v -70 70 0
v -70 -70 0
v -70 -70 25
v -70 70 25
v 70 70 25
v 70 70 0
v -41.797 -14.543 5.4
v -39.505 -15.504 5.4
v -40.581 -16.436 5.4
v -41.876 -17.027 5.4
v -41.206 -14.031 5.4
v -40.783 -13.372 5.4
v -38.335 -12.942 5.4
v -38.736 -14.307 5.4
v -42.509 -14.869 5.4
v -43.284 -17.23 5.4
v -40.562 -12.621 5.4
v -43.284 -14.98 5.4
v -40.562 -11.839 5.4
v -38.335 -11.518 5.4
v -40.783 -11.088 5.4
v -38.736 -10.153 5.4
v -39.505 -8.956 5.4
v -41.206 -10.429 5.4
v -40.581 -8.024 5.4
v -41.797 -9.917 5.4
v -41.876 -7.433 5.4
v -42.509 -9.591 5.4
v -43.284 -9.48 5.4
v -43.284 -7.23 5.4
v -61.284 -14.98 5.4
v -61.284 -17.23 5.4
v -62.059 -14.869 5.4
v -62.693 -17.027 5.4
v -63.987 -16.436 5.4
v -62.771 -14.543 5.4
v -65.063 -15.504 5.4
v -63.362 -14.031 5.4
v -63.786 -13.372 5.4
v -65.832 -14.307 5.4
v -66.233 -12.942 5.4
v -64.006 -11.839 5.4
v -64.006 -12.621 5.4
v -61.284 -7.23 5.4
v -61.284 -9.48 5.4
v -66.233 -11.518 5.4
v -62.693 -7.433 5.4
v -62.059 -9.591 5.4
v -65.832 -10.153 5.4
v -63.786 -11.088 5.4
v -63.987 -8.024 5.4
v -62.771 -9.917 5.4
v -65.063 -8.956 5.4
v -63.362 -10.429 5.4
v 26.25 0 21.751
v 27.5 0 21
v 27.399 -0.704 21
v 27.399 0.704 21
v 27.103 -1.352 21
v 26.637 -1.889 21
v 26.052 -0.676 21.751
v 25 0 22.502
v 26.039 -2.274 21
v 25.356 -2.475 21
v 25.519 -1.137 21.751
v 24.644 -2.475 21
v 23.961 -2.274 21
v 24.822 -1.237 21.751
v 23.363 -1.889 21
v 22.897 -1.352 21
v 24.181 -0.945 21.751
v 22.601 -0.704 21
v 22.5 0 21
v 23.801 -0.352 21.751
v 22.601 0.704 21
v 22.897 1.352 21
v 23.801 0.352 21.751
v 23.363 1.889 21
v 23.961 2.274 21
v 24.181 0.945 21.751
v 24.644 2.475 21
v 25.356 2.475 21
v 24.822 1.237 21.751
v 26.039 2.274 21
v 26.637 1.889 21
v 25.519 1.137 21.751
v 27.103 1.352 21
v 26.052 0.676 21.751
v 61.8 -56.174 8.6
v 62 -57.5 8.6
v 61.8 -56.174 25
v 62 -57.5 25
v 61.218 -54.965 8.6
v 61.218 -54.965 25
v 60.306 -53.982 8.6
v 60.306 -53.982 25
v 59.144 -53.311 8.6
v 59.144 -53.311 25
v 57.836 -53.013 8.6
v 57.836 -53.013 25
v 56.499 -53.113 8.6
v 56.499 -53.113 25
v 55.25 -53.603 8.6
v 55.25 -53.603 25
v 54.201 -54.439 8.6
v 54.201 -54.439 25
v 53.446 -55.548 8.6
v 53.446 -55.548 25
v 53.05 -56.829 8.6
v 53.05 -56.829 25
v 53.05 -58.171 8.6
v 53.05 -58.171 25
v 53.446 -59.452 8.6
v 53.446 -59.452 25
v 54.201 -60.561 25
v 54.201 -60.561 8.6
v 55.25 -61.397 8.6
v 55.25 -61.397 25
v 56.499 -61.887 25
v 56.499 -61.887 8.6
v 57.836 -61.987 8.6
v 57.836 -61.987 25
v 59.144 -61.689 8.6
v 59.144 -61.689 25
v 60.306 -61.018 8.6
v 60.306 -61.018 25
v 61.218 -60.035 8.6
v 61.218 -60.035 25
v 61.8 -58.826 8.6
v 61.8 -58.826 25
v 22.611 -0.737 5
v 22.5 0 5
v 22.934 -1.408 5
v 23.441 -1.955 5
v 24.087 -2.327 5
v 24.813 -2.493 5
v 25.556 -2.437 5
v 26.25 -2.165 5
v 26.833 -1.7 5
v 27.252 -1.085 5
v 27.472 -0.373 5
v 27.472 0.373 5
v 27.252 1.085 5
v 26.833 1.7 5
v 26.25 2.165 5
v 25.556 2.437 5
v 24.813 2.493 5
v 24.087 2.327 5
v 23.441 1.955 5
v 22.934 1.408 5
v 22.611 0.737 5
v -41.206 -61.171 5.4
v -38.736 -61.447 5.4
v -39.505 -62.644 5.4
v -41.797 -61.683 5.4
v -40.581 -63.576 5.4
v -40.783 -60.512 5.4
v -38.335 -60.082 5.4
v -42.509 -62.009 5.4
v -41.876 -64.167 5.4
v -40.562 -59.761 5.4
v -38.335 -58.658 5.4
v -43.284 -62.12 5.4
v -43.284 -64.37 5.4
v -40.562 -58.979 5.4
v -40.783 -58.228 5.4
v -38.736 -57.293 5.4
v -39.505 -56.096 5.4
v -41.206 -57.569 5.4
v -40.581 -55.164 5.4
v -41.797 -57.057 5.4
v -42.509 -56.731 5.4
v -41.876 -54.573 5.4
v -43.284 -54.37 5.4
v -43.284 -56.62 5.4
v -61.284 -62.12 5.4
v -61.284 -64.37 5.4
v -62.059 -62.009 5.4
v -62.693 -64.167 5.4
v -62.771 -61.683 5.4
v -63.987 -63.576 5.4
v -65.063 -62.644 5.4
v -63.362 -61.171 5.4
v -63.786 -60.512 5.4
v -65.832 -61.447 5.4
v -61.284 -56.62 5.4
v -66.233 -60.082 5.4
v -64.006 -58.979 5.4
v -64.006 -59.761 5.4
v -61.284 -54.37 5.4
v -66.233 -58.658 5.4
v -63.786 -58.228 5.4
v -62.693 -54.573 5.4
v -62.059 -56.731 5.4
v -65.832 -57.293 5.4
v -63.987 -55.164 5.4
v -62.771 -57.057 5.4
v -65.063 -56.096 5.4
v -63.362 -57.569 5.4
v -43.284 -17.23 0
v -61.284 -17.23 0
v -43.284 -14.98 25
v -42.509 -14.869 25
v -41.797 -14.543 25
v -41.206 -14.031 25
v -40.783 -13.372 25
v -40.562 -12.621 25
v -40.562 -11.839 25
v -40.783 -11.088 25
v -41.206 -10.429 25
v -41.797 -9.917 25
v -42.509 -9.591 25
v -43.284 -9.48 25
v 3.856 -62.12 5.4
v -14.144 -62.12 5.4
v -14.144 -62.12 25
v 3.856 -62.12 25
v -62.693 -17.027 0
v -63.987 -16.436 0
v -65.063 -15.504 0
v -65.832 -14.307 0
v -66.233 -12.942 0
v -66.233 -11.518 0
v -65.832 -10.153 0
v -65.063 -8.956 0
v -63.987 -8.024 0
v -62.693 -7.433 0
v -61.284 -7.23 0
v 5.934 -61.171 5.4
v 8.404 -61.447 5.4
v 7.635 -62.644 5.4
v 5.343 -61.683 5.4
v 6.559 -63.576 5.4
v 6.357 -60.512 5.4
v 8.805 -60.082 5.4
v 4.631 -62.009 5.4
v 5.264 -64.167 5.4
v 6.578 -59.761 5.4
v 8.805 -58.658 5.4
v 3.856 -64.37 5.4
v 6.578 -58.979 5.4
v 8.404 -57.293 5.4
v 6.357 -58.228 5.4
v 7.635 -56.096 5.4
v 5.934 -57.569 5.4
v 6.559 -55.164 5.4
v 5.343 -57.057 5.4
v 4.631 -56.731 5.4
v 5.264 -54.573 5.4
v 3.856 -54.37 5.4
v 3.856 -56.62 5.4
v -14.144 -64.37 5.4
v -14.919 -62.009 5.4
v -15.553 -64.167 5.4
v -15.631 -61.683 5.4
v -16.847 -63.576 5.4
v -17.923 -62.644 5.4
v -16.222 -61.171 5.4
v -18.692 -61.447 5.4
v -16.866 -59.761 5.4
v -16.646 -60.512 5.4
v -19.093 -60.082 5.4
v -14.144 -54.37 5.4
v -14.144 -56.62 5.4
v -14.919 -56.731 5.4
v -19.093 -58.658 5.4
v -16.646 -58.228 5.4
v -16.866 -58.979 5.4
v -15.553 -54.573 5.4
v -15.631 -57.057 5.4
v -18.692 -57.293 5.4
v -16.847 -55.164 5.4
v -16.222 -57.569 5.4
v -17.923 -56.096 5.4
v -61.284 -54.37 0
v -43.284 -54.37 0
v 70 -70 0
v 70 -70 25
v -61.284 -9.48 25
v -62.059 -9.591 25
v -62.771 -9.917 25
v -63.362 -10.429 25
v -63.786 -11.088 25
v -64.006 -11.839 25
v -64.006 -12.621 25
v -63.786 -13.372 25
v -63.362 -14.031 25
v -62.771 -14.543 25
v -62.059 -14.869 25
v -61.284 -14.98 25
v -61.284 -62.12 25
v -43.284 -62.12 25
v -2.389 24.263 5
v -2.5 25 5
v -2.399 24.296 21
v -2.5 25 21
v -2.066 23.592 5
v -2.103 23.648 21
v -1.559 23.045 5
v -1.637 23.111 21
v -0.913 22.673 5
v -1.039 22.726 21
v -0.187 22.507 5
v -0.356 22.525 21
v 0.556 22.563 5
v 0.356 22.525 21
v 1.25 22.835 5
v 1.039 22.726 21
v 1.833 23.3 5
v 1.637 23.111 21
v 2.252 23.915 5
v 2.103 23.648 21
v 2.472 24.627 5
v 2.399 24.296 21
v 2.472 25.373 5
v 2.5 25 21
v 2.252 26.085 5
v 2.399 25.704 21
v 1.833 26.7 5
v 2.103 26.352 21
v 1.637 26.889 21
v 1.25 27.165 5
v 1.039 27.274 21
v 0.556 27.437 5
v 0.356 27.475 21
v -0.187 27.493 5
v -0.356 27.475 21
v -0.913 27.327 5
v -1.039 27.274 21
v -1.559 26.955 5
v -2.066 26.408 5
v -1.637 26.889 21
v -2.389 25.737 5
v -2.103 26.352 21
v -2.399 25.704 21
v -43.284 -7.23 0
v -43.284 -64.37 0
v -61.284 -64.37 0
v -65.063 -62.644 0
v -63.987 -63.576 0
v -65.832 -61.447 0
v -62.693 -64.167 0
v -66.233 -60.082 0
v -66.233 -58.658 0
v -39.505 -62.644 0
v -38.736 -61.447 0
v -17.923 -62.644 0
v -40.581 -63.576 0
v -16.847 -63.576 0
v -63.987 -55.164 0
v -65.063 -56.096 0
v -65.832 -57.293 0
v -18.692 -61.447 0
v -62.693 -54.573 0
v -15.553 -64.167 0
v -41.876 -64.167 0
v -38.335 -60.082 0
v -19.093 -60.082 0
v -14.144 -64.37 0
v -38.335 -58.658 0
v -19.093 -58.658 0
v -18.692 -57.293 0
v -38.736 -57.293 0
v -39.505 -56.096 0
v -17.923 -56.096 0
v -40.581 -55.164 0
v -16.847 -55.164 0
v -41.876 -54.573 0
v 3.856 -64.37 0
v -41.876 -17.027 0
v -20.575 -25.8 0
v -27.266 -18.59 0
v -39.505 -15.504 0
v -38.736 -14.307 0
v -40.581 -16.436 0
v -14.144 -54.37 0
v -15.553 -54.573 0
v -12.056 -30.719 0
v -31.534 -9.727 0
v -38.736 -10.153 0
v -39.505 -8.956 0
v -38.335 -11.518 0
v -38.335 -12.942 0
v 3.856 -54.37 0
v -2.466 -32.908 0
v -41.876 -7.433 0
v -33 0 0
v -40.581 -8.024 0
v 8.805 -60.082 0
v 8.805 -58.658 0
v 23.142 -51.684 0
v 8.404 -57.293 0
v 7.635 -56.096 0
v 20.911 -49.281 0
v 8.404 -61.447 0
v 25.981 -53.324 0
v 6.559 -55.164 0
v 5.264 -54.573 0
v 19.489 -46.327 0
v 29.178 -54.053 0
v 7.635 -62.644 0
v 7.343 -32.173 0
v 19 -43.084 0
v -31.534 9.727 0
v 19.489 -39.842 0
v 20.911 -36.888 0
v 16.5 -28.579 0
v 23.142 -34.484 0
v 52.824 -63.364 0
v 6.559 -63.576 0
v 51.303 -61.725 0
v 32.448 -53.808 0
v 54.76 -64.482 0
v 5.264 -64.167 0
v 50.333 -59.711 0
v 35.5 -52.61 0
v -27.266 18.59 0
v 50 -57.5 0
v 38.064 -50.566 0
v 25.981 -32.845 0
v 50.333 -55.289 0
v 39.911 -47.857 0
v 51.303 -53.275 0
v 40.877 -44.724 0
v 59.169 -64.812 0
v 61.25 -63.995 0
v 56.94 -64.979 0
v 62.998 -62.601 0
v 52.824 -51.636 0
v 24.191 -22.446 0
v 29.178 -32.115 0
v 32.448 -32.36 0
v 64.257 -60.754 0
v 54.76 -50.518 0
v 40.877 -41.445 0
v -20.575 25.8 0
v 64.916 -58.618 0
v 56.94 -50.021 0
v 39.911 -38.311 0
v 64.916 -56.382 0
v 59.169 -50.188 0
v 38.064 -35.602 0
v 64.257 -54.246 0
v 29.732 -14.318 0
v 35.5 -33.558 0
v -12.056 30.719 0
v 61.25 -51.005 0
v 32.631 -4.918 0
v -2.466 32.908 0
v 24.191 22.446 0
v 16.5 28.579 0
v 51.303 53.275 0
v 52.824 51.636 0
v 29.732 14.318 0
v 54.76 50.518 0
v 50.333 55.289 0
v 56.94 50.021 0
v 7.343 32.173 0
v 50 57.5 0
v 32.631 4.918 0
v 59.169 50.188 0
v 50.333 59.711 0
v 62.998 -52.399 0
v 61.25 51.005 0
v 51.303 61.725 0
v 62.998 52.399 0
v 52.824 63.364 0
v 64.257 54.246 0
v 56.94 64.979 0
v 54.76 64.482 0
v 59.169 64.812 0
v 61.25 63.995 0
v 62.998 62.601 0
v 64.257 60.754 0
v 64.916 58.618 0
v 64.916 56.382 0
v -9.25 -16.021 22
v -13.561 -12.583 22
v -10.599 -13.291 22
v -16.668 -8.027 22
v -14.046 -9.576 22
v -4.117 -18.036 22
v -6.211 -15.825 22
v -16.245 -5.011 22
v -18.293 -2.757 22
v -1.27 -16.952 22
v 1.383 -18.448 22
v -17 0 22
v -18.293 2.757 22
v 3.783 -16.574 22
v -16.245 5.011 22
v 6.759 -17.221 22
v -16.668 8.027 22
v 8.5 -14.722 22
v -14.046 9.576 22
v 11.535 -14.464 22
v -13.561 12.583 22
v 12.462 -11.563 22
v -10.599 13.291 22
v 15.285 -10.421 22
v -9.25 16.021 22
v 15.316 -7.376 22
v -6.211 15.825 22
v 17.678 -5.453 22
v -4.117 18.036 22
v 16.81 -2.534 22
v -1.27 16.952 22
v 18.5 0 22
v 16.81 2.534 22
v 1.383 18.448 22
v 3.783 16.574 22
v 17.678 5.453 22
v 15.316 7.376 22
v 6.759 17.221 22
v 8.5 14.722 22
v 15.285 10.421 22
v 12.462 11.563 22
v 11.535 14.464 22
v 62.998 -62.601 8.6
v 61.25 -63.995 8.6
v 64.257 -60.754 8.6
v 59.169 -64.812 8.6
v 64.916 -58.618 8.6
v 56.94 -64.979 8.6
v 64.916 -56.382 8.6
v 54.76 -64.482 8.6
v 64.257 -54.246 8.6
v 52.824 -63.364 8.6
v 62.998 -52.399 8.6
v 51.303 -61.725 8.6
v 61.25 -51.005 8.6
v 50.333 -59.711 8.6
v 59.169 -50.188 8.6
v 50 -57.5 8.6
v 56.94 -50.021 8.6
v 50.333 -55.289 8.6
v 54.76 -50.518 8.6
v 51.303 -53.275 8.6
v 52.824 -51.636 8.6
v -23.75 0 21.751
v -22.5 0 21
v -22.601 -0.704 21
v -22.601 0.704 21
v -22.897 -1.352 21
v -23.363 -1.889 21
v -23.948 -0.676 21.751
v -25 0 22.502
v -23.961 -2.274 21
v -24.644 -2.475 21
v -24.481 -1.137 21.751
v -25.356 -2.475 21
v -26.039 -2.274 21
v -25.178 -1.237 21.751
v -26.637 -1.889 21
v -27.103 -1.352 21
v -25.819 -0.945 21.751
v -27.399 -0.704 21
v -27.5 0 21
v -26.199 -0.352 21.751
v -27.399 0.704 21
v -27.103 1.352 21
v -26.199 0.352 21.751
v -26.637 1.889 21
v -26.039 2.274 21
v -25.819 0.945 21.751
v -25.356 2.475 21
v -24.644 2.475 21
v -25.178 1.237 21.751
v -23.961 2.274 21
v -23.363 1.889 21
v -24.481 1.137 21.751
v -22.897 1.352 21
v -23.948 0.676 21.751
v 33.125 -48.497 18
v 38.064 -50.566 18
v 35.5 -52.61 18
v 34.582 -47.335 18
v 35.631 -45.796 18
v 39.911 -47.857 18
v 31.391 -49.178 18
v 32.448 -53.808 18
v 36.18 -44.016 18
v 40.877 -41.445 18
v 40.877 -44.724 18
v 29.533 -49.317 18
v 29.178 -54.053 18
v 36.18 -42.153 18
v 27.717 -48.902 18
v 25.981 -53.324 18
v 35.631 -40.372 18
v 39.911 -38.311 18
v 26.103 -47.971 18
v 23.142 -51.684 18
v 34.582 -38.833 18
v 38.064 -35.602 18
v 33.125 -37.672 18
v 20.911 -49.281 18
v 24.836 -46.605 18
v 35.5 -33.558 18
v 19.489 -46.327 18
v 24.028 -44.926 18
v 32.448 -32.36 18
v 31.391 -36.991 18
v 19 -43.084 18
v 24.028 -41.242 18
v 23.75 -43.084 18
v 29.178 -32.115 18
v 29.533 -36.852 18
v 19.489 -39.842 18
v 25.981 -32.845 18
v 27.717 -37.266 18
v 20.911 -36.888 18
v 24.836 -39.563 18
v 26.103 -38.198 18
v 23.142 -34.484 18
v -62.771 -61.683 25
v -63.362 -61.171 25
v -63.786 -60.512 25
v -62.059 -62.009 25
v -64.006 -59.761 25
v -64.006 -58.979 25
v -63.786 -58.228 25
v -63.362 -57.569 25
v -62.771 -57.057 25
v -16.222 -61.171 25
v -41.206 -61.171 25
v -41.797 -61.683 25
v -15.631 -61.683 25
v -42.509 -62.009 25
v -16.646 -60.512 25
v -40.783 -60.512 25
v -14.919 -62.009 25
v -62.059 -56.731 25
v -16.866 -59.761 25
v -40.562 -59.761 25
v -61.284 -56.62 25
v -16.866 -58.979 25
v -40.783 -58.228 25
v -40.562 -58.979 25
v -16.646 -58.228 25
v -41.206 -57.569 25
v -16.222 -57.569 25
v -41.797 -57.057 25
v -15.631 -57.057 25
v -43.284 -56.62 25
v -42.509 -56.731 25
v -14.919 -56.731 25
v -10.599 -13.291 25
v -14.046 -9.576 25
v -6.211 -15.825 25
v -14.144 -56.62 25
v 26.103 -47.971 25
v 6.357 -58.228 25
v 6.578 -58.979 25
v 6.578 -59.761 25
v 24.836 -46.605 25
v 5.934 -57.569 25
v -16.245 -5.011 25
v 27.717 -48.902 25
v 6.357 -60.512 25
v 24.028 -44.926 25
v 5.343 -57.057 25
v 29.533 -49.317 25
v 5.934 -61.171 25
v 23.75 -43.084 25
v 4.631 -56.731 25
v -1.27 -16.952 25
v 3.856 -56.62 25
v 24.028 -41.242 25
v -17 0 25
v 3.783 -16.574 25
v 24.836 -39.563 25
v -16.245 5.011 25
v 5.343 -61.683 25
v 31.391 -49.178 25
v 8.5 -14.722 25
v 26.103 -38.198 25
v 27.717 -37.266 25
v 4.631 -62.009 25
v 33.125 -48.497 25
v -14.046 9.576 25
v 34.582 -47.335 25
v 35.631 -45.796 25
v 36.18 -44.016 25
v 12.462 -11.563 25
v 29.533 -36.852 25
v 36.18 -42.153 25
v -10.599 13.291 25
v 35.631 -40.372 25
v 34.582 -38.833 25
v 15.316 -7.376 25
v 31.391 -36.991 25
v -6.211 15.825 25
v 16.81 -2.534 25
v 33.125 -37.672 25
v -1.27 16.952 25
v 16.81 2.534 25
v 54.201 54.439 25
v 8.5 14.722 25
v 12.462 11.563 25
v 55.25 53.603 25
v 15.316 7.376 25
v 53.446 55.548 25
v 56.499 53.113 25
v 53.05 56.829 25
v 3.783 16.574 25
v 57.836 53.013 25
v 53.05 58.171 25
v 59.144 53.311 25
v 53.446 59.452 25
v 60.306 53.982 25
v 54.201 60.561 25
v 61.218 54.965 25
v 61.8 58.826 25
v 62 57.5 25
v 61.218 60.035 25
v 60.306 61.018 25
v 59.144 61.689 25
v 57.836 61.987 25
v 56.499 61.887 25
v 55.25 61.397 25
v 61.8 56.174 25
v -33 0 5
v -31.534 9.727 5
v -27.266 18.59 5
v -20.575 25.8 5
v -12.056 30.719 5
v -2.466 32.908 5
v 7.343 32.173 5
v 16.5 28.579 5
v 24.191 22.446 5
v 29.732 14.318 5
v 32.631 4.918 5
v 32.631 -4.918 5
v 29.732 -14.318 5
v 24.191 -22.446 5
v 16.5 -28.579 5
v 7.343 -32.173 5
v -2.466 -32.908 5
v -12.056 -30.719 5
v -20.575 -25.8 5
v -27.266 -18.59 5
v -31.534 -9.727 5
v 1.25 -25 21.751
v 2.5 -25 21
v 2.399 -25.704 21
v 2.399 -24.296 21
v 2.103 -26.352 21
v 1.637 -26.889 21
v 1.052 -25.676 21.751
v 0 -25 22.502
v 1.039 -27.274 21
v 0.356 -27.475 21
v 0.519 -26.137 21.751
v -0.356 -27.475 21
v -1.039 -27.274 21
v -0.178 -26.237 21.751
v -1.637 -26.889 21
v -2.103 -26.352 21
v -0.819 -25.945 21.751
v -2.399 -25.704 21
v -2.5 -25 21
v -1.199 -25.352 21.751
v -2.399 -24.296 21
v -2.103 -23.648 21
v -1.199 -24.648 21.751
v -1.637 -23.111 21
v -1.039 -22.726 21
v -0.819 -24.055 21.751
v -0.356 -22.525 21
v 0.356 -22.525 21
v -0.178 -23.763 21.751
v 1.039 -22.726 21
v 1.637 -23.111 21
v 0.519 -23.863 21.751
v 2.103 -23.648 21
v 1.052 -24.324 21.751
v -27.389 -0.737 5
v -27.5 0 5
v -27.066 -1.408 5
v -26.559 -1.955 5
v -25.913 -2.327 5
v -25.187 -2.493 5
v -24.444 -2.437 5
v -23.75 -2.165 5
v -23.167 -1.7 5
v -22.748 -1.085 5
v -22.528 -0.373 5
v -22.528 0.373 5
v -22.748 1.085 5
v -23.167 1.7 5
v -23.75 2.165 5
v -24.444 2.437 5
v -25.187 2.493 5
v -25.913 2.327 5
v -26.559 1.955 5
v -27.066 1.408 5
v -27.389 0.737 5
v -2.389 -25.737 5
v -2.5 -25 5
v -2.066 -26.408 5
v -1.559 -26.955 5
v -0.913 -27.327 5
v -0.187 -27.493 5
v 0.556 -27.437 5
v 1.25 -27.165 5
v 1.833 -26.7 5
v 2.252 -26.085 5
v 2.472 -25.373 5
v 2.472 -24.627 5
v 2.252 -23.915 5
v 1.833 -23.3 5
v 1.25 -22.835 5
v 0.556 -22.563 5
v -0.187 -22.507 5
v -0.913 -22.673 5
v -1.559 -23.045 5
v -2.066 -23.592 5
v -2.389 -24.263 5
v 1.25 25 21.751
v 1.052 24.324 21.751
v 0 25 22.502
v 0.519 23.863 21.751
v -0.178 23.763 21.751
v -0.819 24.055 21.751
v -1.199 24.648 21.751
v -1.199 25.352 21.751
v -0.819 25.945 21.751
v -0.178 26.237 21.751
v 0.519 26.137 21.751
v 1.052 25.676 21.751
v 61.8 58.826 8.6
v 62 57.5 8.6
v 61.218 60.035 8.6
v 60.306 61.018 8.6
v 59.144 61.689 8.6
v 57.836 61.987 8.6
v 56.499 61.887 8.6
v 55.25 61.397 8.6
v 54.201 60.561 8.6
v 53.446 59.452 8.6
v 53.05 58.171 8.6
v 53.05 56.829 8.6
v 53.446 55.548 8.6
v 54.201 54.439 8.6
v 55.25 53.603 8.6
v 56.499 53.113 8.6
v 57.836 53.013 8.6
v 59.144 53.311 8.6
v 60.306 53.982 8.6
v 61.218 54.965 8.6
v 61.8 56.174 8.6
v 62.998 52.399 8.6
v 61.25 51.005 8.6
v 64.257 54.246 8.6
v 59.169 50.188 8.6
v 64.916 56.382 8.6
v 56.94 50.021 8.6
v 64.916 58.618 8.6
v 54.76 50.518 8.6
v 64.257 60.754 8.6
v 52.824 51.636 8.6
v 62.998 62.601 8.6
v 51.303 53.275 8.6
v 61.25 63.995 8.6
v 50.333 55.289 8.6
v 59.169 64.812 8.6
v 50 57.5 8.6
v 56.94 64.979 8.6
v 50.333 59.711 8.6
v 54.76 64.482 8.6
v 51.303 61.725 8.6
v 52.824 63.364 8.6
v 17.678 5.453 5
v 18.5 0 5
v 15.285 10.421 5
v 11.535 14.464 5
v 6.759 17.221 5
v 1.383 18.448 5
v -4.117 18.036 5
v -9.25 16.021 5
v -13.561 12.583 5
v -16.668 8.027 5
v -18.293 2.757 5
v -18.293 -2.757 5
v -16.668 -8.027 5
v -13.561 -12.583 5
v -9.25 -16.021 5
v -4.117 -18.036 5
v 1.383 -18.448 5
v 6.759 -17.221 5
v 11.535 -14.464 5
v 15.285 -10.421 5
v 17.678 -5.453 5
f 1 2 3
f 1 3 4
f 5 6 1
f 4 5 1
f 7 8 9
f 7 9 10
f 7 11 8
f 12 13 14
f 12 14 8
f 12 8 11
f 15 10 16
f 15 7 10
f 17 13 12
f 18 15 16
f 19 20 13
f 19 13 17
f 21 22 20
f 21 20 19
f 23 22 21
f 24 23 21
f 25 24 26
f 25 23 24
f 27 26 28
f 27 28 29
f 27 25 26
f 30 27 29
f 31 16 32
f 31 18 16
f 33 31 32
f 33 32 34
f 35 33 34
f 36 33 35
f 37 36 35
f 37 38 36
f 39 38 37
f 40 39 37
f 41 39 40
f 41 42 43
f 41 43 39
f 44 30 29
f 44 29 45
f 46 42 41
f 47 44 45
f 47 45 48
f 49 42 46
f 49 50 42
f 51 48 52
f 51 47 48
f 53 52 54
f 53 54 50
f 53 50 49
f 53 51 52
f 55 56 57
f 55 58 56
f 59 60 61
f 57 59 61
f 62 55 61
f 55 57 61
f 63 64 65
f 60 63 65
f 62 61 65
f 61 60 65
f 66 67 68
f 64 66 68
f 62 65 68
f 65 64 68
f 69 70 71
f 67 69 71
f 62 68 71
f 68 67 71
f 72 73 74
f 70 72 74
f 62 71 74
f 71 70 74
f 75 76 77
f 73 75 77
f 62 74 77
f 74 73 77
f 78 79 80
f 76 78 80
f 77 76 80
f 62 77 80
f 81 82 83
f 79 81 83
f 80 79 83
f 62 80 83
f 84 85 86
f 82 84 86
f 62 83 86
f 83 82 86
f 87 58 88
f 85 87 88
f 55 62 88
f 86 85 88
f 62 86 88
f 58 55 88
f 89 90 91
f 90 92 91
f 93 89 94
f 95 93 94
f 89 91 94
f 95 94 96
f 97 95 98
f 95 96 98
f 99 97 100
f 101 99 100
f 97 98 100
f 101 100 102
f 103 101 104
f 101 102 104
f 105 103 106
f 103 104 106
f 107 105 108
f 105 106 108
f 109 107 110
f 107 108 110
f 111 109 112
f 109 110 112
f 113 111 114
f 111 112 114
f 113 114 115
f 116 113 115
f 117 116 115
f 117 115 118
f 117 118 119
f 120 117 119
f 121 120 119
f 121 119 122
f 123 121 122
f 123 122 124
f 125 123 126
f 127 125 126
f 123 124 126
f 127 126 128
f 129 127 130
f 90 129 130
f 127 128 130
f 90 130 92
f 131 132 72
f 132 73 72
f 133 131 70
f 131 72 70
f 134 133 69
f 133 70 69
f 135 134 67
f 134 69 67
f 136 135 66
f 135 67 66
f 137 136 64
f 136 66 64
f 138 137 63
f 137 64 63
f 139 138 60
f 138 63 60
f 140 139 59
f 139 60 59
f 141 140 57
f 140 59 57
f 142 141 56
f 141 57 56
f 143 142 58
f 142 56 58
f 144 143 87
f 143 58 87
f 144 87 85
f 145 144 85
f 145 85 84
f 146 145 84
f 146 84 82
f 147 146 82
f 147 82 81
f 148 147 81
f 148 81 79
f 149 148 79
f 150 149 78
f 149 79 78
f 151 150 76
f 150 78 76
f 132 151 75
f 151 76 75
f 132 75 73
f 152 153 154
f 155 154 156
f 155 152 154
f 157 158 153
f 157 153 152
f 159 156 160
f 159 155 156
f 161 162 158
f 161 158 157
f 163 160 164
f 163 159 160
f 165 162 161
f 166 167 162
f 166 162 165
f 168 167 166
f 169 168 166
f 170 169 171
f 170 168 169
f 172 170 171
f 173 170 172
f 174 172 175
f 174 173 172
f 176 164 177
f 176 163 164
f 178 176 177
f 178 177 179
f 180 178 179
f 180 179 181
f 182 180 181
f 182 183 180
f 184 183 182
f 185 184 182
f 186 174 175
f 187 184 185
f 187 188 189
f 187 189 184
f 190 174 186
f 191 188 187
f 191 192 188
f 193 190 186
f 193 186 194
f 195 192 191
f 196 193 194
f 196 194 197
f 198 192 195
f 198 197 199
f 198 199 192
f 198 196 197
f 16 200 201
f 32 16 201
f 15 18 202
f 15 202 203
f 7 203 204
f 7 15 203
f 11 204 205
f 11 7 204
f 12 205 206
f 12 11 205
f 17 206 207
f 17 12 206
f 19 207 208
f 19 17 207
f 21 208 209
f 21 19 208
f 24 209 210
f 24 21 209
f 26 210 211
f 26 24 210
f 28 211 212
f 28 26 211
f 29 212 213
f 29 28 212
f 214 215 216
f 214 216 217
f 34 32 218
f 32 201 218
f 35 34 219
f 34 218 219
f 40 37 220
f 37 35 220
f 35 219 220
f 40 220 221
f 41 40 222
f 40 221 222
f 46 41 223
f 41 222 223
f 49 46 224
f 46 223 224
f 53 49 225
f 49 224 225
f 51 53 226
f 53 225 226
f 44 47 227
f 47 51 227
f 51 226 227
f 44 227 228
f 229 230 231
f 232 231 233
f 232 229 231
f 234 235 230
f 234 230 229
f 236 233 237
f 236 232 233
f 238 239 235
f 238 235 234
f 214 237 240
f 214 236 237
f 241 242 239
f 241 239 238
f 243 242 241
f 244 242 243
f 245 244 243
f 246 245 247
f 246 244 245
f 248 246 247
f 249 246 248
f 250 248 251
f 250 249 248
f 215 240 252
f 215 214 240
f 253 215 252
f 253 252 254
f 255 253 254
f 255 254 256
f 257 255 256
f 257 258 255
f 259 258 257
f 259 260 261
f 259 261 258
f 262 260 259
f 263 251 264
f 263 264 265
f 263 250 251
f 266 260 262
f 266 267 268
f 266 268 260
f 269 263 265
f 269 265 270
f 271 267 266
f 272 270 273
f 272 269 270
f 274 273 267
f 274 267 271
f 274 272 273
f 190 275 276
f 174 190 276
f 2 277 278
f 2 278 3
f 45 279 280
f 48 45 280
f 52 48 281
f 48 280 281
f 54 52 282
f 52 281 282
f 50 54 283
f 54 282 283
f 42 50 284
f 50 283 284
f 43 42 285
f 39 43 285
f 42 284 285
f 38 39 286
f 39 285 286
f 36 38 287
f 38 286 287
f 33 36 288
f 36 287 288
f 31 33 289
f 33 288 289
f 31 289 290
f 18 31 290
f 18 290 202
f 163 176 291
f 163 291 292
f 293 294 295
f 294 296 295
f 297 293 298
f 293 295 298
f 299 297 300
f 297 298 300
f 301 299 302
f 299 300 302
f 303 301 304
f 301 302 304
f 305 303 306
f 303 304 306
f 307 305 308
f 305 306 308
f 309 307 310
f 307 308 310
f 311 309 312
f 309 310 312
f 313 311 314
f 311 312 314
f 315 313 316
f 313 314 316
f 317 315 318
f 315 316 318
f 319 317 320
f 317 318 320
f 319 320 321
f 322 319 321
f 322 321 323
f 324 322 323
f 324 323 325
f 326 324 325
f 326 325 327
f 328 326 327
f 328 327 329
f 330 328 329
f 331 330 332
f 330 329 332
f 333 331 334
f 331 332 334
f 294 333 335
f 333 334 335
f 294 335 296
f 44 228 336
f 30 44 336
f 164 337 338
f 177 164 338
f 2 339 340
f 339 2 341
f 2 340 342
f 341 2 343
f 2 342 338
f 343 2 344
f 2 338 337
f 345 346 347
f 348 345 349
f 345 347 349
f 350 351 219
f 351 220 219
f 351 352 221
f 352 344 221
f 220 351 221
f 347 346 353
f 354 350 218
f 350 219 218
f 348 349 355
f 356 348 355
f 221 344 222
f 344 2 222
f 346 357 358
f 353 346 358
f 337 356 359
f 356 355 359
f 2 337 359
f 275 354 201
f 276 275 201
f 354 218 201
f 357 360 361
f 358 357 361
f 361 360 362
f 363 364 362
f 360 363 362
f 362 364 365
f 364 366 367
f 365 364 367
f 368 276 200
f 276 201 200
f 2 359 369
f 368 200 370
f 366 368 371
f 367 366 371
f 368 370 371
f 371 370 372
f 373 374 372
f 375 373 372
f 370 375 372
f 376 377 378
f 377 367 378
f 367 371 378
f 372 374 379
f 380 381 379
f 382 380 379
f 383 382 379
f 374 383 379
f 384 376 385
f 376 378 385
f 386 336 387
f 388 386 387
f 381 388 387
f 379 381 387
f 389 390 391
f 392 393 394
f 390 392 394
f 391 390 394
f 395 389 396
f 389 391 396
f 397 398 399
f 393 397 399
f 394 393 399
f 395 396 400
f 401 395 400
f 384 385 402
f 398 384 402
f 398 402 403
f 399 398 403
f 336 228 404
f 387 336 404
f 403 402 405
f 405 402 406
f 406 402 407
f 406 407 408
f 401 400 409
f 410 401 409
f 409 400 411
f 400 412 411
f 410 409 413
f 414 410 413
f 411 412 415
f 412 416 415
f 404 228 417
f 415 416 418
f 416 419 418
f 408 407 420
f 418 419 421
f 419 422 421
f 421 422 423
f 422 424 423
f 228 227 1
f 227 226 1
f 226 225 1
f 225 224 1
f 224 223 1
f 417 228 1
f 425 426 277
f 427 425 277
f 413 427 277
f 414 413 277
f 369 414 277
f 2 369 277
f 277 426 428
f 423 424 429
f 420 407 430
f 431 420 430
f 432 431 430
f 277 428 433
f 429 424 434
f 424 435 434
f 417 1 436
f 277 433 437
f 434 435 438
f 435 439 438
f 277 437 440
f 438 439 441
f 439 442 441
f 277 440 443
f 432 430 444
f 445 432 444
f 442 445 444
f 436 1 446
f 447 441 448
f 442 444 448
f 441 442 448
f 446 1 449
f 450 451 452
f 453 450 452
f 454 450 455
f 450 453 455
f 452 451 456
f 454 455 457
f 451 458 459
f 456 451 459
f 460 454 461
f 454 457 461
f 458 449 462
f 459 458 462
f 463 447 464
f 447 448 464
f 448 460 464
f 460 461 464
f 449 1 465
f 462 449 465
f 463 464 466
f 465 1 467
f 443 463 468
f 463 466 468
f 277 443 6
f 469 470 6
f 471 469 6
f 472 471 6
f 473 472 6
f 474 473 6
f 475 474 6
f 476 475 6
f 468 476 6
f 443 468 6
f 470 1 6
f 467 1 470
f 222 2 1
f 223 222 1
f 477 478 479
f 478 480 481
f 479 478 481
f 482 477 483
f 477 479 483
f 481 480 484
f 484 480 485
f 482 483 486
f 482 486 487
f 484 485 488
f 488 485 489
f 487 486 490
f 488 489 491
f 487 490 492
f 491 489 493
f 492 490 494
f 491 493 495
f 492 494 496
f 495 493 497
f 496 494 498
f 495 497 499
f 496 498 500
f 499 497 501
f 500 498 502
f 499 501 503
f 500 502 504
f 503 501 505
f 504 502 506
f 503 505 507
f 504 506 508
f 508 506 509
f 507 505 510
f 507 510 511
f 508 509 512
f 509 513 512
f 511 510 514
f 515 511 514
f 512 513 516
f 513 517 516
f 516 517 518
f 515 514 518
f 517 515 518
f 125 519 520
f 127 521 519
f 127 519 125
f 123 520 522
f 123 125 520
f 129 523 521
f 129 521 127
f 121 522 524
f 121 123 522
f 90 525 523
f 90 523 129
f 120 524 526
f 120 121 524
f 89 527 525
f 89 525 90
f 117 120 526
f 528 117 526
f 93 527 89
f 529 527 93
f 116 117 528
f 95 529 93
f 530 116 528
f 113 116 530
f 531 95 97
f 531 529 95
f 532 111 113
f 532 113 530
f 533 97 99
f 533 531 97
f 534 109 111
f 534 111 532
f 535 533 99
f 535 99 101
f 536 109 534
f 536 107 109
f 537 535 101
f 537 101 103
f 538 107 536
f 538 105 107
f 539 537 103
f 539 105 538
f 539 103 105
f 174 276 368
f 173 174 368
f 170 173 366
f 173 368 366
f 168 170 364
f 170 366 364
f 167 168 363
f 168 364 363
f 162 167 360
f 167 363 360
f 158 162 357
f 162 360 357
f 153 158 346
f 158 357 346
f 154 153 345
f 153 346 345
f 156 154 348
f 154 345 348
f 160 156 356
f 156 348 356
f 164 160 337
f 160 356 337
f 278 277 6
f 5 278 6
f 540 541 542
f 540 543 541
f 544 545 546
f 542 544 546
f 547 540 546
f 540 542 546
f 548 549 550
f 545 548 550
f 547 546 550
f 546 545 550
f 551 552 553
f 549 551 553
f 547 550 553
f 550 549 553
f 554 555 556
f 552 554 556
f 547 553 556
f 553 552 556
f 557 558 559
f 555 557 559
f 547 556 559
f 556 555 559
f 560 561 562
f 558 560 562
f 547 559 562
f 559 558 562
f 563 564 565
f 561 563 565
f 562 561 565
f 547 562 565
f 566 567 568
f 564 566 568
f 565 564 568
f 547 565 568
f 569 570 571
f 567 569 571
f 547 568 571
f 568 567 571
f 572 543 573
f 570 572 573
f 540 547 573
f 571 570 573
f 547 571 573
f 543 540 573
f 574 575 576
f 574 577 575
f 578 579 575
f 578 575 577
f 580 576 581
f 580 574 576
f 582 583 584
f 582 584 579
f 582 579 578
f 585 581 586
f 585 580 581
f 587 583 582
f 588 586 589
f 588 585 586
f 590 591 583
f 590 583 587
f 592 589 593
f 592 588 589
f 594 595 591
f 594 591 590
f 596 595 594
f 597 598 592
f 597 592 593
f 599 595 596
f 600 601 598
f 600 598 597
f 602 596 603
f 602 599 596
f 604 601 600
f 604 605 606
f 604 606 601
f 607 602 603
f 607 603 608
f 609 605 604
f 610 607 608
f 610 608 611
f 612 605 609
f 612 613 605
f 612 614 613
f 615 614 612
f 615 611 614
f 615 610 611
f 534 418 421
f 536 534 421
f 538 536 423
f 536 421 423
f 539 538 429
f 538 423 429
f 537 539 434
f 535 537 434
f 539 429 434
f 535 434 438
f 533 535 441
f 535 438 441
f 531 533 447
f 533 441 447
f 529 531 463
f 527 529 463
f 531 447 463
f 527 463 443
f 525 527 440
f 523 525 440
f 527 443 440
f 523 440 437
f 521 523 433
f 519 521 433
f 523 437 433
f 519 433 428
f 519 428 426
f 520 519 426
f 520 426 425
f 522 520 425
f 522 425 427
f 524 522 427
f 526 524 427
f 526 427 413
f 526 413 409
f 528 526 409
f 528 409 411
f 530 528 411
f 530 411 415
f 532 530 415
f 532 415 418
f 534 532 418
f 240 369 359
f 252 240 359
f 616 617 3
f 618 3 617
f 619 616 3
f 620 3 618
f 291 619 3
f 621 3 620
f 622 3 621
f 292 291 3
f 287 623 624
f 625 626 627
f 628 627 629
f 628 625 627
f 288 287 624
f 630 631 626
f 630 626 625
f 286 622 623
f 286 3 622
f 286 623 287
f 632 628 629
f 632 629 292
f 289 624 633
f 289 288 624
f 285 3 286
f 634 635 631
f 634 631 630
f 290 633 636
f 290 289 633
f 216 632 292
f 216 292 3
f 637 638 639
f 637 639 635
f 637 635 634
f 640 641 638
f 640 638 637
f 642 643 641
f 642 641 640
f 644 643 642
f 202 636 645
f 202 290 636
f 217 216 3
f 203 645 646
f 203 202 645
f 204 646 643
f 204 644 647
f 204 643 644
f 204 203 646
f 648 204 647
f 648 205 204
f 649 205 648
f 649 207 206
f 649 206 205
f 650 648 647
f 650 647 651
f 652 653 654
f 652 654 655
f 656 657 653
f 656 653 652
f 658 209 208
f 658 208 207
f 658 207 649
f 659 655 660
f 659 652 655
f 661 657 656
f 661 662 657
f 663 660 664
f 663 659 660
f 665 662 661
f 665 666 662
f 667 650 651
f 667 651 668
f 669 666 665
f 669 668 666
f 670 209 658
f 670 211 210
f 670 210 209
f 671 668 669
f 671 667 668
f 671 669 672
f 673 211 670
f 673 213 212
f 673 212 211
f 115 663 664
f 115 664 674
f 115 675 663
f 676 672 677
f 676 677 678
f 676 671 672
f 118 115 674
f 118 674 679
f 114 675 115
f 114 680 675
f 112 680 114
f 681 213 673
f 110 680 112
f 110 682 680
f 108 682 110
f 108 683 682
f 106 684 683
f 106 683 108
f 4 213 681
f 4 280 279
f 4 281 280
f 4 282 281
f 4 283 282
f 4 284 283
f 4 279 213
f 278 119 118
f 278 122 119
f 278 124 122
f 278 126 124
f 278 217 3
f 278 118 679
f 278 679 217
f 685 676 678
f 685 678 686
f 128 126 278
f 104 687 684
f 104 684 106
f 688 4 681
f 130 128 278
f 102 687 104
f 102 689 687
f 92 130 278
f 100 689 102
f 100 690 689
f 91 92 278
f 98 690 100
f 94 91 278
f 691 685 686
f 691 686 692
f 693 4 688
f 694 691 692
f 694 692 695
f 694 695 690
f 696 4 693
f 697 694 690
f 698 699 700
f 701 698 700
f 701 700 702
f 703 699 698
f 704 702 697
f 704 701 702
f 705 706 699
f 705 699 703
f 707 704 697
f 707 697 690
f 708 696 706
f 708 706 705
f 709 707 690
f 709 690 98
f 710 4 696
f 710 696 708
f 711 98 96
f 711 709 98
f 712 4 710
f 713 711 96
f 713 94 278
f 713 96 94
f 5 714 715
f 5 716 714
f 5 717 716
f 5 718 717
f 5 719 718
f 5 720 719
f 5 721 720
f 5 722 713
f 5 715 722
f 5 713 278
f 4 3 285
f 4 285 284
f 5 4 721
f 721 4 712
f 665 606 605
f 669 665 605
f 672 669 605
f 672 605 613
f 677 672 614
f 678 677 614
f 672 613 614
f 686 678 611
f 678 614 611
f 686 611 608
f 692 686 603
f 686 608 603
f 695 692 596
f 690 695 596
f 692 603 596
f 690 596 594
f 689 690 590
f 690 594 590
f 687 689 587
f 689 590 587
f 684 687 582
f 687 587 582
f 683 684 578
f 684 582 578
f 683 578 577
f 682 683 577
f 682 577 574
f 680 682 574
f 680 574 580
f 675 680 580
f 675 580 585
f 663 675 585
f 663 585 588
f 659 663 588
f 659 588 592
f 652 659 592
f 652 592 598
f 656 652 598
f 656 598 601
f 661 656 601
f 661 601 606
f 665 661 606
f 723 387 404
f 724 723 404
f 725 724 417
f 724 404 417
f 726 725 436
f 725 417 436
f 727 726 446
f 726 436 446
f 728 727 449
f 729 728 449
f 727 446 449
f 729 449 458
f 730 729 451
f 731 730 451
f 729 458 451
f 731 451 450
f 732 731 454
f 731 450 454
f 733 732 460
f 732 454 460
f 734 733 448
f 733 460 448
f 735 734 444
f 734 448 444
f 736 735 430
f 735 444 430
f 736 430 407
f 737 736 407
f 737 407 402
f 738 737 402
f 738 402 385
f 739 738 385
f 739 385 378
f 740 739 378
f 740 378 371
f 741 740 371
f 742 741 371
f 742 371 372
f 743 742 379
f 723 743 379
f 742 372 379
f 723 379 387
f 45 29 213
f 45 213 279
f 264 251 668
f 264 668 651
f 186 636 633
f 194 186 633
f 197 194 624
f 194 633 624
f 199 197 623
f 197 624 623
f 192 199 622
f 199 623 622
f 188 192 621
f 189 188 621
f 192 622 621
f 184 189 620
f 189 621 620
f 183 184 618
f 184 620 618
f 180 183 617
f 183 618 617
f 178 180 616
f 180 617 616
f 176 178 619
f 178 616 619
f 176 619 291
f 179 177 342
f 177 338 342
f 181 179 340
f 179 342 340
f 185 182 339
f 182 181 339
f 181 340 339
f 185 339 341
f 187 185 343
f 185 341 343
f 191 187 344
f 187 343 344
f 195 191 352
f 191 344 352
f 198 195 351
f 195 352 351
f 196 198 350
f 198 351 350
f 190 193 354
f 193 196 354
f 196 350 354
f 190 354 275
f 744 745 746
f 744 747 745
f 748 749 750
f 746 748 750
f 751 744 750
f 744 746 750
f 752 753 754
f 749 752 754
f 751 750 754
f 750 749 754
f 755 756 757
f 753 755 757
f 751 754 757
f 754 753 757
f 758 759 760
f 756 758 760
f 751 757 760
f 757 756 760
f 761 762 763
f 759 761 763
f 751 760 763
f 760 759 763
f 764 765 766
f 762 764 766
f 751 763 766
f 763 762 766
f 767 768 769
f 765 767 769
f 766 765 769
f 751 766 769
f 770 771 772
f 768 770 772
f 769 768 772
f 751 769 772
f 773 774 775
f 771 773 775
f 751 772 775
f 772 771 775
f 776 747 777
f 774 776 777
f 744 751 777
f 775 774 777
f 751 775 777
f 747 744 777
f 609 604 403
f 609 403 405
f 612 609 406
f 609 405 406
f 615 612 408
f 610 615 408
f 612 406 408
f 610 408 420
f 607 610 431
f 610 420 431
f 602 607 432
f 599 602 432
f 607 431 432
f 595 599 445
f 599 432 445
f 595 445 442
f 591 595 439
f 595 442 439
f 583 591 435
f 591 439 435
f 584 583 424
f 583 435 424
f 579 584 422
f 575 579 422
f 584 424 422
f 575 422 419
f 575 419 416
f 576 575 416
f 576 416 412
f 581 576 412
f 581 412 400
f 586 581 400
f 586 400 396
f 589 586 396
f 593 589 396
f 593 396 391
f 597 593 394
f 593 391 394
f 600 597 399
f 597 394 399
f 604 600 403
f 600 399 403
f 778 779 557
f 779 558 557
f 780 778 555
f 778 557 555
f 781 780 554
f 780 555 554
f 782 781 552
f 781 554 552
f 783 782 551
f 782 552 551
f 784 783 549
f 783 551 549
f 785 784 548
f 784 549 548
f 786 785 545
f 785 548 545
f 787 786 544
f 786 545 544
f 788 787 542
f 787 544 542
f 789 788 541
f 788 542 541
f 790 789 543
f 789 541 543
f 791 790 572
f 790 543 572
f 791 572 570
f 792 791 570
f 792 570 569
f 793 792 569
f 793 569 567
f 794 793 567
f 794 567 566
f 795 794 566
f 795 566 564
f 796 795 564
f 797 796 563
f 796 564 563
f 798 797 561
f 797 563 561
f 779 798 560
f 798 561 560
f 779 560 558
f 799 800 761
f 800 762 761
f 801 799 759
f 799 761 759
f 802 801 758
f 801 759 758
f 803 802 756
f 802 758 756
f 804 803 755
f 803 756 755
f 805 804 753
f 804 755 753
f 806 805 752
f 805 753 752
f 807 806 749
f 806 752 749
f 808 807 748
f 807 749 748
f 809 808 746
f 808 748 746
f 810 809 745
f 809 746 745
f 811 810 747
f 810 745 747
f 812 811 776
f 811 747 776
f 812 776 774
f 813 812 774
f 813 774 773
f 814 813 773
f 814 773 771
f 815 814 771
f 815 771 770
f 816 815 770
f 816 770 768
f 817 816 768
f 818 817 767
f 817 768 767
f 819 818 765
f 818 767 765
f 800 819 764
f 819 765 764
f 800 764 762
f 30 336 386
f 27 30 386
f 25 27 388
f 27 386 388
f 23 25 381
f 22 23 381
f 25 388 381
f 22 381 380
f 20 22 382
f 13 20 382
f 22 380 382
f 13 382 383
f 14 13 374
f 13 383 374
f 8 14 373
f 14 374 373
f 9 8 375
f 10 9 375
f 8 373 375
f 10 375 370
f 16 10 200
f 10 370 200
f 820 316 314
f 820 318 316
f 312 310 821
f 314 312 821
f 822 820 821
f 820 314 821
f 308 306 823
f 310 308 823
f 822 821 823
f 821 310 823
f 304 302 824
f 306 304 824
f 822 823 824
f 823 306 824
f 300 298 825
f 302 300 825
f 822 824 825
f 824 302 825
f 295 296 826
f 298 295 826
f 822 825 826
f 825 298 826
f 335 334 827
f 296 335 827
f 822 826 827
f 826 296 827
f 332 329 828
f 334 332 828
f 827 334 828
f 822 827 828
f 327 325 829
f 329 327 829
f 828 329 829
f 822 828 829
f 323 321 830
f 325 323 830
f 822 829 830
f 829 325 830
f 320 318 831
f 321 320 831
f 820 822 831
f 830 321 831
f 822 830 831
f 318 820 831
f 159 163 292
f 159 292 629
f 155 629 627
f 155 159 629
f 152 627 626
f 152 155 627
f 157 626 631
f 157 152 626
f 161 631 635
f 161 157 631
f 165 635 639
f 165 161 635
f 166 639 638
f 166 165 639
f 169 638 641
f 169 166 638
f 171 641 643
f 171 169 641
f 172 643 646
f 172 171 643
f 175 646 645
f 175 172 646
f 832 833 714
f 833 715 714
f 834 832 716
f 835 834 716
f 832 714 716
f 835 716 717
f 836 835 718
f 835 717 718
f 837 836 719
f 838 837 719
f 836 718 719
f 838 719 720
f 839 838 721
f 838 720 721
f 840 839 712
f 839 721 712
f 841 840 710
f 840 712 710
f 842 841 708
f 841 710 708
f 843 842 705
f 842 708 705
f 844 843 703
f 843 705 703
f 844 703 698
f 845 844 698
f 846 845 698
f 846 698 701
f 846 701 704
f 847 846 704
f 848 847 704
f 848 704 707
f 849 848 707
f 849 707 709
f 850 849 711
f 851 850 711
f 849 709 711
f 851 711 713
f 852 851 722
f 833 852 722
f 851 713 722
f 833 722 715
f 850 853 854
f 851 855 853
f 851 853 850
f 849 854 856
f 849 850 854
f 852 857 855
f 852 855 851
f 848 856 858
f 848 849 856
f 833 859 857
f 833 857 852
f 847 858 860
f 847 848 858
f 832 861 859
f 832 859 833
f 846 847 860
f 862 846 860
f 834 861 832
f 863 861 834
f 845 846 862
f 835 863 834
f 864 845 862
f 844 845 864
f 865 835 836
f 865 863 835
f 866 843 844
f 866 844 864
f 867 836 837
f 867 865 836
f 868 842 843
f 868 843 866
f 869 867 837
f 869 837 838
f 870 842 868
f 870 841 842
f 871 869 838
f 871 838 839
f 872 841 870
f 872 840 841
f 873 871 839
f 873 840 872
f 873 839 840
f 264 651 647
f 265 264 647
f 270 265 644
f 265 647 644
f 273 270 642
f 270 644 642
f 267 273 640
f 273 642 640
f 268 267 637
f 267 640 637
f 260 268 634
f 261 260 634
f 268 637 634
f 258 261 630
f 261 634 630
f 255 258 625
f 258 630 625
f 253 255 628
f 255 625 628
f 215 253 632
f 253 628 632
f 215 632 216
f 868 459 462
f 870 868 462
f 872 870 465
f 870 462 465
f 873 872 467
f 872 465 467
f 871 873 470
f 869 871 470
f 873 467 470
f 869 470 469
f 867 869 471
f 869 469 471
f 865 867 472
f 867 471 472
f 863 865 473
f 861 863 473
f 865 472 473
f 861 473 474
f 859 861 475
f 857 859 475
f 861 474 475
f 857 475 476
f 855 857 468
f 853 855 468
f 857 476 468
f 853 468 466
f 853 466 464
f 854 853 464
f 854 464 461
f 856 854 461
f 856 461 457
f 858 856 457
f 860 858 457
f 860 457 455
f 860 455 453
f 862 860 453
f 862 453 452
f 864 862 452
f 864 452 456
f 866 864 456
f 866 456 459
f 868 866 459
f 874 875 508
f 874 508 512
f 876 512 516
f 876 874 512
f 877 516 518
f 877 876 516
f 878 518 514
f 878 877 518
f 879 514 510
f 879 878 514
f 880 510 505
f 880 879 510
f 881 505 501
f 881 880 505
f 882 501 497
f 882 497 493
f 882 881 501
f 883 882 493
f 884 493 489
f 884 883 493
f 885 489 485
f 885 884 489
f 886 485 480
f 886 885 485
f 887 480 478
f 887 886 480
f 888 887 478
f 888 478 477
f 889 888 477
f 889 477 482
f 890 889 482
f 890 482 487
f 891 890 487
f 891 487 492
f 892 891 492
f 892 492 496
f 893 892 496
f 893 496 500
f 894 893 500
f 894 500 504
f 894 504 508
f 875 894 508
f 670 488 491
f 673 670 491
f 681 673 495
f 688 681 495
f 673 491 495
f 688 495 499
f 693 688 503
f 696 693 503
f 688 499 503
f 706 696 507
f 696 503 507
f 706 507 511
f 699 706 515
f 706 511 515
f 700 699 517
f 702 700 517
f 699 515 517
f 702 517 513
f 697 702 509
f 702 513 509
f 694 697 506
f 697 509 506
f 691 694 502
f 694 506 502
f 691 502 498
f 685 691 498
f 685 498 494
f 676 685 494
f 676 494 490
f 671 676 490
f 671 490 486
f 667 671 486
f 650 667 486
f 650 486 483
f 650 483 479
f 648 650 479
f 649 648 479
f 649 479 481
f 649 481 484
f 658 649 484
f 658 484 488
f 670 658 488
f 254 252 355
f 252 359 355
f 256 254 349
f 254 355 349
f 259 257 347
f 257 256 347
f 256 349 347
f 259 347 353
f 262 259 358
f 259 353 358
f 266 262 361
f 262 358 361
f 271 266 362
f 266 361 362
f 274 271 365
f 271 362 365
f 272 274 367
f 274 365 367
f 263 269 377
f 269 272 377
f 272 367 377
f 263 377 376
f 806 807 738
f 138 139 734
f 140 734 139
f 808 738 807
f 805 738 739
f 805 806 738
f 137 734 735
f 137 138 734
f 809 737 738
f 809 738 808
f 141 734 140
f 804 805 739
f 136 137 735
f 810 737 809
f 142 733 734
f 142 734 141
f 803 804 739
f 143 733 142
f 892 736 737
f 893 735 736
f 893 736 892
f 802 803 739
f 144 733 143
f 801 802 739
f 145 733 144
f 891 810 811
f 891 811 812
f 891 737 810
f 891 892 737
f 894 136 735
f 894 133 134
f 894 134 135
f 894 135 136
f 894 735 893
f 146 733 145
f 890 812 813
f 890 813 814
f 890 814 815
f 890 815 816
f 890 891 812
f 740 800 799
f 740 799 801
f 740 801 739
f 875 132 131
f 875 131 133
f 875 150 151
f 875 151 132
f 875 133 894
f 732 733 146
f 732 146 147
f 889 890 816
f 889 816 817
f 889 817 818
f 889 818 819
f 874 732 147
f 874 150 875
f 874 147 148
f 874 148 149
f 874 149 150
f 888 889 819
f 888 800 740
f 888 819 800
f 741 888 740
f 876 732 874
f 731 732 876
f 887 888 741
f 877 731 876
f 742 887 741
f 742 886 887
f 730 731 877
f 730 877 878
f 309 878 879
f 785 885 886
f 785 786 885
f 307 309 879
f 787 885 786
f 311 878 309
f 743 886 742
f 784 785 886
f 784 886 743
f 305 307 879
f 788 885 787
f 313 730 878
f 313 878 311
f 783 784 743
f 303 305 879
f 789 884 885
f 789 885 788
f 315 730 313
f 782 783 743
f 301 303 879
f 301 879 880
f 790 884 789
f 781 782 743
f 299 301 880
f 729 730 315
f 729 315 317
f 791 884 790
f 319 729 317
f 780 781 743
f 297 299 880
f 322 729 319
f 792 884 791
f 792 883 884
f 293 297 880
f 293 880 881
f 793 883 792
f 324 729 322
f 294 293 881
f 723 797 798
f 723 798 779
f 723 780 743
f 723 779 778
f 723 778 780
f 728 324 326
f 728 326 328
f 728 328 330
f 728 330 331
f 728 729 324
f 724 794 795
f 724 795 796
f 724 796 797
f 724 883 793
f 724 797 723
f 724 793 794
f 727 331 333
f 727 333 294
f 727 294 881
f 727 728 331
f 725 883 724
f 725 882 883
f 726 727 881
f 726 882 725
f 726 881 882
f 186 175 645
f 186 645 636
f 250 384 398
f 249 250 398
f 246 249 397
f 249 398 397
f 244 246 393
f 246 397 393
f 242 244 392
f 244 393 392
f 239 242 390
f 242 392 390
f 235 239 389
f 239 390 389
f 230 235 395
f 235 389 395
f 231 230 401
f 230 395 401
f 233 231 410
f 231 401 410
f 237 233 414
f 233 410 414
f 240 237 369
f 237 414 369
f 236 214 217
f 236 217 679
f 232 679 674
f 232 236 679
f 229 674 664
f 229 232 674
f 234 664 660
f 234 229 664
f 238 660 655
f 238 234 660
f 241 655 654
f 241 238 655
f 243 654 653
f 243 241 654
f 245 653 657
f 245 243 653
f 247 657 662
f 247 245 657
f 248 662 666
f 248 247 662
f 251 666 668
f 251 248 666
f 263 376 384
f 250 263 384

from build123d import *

# Parameters (mm, degrees)
ESQUISSE1_W                                        = 150
ESQUISSE1_H                                        = 150
BOSS_EXTRU_1_DEPTH                                 = 25
CHAMBRAGE_POUR_VIS_T_TE_HEXAGONALE_M81_D           = 9
CHAMBRAGE_POUR_VIS_T_TE_HEXAGONALE_M81_CBORE_D     = 15
CHAMBRAGE_POUR_VIS_T_TE_HEXAGONALE_M81_CBORE_DEPTH = 8.6
CHAMBRAGE_POUR_VIS_T_TE_HEXAGONALE_M51_D           = 5.5
CHAMBRAGE_POUR_VIS_T_TE_HEXAGONALE_M51_CBORE_D     = 10
CHAMBRAGE_POUR_VIS_T_TE_HEXAGONALE_M51_CBORE_DEPTH = 5.4
ESQUISSE13_R                                       = 18.5
ENL_V_MAT_EXTRU_1_DEPTH                            = 22
ESQUISSE14_R                                       = 17
ENL_V_MAT_EXTRU_2_DEPTH                            = 4
ESQUISSE31_R                                       = 33
ENL_V_MAT_EXTRU_11_DEPTH                           = 5
TROU_POUR_TARAUDAGE_POUR_TROU_TARAUD_M6_D          = 5
TROU_POUR_TARAUDAGE_POUR_TROU_TARAUD_M6_DEPTH      = 16
TROU_POUR_TARAUDAGE_POUR_TROU_TARAUD_M6_TIP        = 1.502151548
ESQUISSE27_R                                       = 11
ENL_V_MAT_EXTRU_7_DEPTH                            = 18
ESQUISSE28_R                                       = 6.25
ENL_V_MAT_EXTRU_8_DEPTH                            = 8
ENL_V_MAT_EXTRU_9_DEPTH                            = 20.6
ENL_V_MAT_EXTRU_10_DEPTH                           = 5.4
ESQUISSE32_R                                       = 129.983308099
ESQUISSE32_W                                       = 140
ESQUISSE32_H                                       = 140
ENL_V_MAT_EXTRU_12_DEPTH                           = 26


with BuildPart() as part:
    # Esquisse1 → Boss.-Extru.1 (new body)
    with BuildSketch(Plane.XY):
        Rectangle(ESQUISSE1_W, ESQUISSE1_H)
    extrude(amount=BOSS_EXTRU_1_DEPTH)

    # Chambrage pour vis à tête hexagonale M81 (through all)
    with Locations(Plane(origin=(0, 0, 0), x_dir=(-1, 0, 0), z_dir=(0, 0, -1))):
        with Locations((-57.5, -57.5), (-57.5, 57.5)):
            CounterBoreHole(CHAMBRAGE_POUR_VIS_T_TE_HEXAGONALE_M81_D / 2, CHAMBRAGE_POUR_VIS_T_TE_HEXAGONALE_M81_CBORE_D / 2, CHAMBRAGE_POUR_VIS_T_TE_HEXAGONALE_M81_CBORE_DEPTH)

    # Chambrage pour vis à tête hexagonale M51 (through all)
    with Locations(Plane(origin=(0, 0, 0), x_dir=(-1, 0, 0), z_dir=(0, 0, -1))):
        with Locations((14.144188312, -59.37), (61.284188312, -59.37), (61.284188312, -12.23)):
            CounterBoreHole(CHAMBRAGE_POUR_VIS_T_TE_HEXAGONALE_M51_D / 2, CHAMBRAGE_POUR_VIS_T_TE_HEXAGONALE_M51_CBORE_D / 2, CHAMBRAGE_POUR_VIS_T_TE_HEXAGONALE_M51_CBORE_DEPTH)

    # Esquisse13 → Enlèv. mat.-Extru.1 (cut)
    with BuildSketch(Plane.XY):
        Circle(ESQUISSE13_R)
    extrude(amount=ENL_V_MAT_EXTRU_1_DEPTH, mode=Mode.SUBTRACT)

    # Esquisse14 → Enlèv. mat.-Extru.2 (cut, through all)
    with BuildSketch(Plane(origin=(0, 0, 22), x_dir=(-1, 0, 0), z_dir=(0, 0, -1))):
        Circle(ESQUISSE14_R)
    extrude(amount=-ENL_V_MAT_EXTRU_2_DEPTH, mode=Mode.SUBTRACT)

    # Esquisse31 → Enlèv. mat.-Extru.11 (cut)
    with BuildSketch(Plane(origin=(0, 0, 0), x_dir=(-1, 0, 0), z_dir=(0, 0, -1))):
        Circle(ESQUISSE31_R)
    extrude(amount=-ENL_V_MAT_EXTRU_11_DEPTH, mode=Mode.SUBTRACT)

    # Trou pour taraudage pour trou taraudé M61
    with Locations(Plane(origin=(0, 0, 5), x_dir=(1, 0, 0), z_dir=(0, 0, -1))):
        with Locations((0, 25), (-25, 0), (0, -25), (25, 0), (0, 0)):
            Hole(TROU_POUR_TARAUDAGE_POUR_TROU_TARAUD_M6_D / 2, depth=TROU_POUR_TARAUDAGE_POUR_TROU_TARAUD_M6_DEPTH)
            with Locations((0, 0, -(TROU_POUR_TARAUDAGE_POUR_TROU_TARAUD_M6_DEPTH + TROU_POUR_TARAUDAGE_POUR_TROU_TARAUD_M6_TIP / 2))):  # 118° drill point
                Cone(0, TROU_POUR_TARAUDAGE_POUR_TROU_TARAUD_M6_D / 2, TROU_POUR_TARAUDAGE_POUR_TROU_TARAUD_M6_TIP, mode=Mode.SUBTRACT)

    # Esquisse27 → Enlèv. mat.-Extru.7 (cut)
    with BuildSketch(Plane(origin=(0, 0, 0), x_dir=(-1, 0, 0), z_dir=(0, 0, -1))):
        with Locations((-30, -43.084219849)):
            Circle(ESQUISSE27_R)
    extrude(amount=-ENL_V_MAT_EXTRU_7_DEPTH, mode=Mode.SUBTRACT)

    # Esquisse28 → Enlèv. mat.-Extru.8 (cut, through all)
    with BuildSketch(Plane(origin=(0, 0, 18), x_dir=(-1, 0, 0), z_dir=(0, 0, -1))):
        with Locations((-30, -43.084219849)):
            Circle(ESQUISSE28_R)
    extrude(amount=-ENL_V_MAT_EXTRU_8_DEPTH, mode=Mode.SUBTRACT)

    # Esquisse29 → Enlèv. mat.-Extru.9 (cut, through all)
    with BuildSketch(Plane(origin=(0, 0, 5.4), x_dir=(-1, 0, 0), z_dir=(0, 0, -1))):
        with BuildLine():
            Line((61.284188312, -62.12), (43.284188312, -62.12))
            ThreePointArc((43.284188312, -62.12), (40.534188312, -59.37), (43.284188312, -56.62))
            Line((43.284188312, -56.62), (61.284188312, -56.62))
            ThreePointArc((61.284188312, -56.62), (64.034188312, -59.37), (61.284188312, -62.12))
        make_face()
        with BuildLine():
            Line((14.144188312, -62.12), (-3.855811688, -62.12))
            ThreePointArc((-3.855811688, -62.12), (-6.605811688, -59.37), (-3.855811688, -56.62))
            Line((-3.855811688, -56.62), (14.144188312, -56.62))
            ThreePointArc((14.144188312, -56.62), (16.894188312, -59.37), (14.144188312, -62.12))
        make_face()
        with BuildLine():
            Line((61.284188312, -14.98), (43.284188312, -14.98))
            ThreePointArc((43.284188312, -14.98), (40.534188312, -12.23), (43.284188312, -9.48))
            Line((43.284188312, -9.48), (61.284188312, -9.48))
            ThreePointArc((61.284188312, -9.48), (64.034188312, -12.23), (61.284188312, -14.98))
        make_face()
    extrude(amount=-ENL_V_MAT_EXTRU_9_DEPTH, mode=Mode.SUBTRACT)

    # Esquisse30 → Enlèv. mat.-Extru.10 (cut)
    with BuildSketch(Plane(origin=(0, 0, 0), x_dir=(-1, 0, 0), z_dir=(0, 0, -1))):
        with BuildLine():
            Line((-3.855811688, -64.37), (14.144188312, -64.37))
            ThreePointArc((14.144188312, -64.37), (19.144188312, -59.37), (14.144188312, -54.37))
            Line((14.144188312, -54.37), (-3.855811688, -54.37))
            ThreePointArc((-3.855811688, -54.37), (-8.855811688, -59.37), (-3.855811688, -64.37))
        make_face()
        with BuildLine():
            Line((43.284188312, -64.37), (61.284188312, -64.37))
            ThreePointArc((61.284188312, -64.37), (66.284188312, -59.37), (61.284188312, -54.37))
            Line((61.284188312, -54.37), (43.284188312, -54.37))
            ThreePointArc((43.284188312, -54.37), (38.284188312, -59.37), (43.284188312, -64.37))
        make_face()
        with BuildLine():
            Line((43.284188312, -17.23), (61.284188312, -17.23))
            ThreePointArc((61.284188312, -17.23), (66.284188312, -12.23), (61.284188312, -7.23))
            Line((61.284188312, -7.23), (43.284188312, -7.23))
            ThreePointArc((43.284188312, -7.23), (38.284188312, -12.23), (43.284188312, -17.23))
        make_face()
    extrude(amount=-ENL_V_MAT_EXTRU_10_DEPTH, mode=Mode.SUBTRACT)

    # Esquisse32 → Enlèv. mat.-Extru.12 (cut, through all)
    with BuildSketch(Plane(origin=(0, 0, 0), x_dir=(-1, 0, 0), z_dir=(0, 0, -1))):
        Circle(ESQUISSE32_R)
        Rectangle(ESQUISSE32_W, ESQUISSE32_H, mode=Mode.SUBTRACT)
    extrude(amount=-ENL_V_MAT_EXTRU_12_DEPTH, mode=Mode.SUBTRACT)


solid = part.part
